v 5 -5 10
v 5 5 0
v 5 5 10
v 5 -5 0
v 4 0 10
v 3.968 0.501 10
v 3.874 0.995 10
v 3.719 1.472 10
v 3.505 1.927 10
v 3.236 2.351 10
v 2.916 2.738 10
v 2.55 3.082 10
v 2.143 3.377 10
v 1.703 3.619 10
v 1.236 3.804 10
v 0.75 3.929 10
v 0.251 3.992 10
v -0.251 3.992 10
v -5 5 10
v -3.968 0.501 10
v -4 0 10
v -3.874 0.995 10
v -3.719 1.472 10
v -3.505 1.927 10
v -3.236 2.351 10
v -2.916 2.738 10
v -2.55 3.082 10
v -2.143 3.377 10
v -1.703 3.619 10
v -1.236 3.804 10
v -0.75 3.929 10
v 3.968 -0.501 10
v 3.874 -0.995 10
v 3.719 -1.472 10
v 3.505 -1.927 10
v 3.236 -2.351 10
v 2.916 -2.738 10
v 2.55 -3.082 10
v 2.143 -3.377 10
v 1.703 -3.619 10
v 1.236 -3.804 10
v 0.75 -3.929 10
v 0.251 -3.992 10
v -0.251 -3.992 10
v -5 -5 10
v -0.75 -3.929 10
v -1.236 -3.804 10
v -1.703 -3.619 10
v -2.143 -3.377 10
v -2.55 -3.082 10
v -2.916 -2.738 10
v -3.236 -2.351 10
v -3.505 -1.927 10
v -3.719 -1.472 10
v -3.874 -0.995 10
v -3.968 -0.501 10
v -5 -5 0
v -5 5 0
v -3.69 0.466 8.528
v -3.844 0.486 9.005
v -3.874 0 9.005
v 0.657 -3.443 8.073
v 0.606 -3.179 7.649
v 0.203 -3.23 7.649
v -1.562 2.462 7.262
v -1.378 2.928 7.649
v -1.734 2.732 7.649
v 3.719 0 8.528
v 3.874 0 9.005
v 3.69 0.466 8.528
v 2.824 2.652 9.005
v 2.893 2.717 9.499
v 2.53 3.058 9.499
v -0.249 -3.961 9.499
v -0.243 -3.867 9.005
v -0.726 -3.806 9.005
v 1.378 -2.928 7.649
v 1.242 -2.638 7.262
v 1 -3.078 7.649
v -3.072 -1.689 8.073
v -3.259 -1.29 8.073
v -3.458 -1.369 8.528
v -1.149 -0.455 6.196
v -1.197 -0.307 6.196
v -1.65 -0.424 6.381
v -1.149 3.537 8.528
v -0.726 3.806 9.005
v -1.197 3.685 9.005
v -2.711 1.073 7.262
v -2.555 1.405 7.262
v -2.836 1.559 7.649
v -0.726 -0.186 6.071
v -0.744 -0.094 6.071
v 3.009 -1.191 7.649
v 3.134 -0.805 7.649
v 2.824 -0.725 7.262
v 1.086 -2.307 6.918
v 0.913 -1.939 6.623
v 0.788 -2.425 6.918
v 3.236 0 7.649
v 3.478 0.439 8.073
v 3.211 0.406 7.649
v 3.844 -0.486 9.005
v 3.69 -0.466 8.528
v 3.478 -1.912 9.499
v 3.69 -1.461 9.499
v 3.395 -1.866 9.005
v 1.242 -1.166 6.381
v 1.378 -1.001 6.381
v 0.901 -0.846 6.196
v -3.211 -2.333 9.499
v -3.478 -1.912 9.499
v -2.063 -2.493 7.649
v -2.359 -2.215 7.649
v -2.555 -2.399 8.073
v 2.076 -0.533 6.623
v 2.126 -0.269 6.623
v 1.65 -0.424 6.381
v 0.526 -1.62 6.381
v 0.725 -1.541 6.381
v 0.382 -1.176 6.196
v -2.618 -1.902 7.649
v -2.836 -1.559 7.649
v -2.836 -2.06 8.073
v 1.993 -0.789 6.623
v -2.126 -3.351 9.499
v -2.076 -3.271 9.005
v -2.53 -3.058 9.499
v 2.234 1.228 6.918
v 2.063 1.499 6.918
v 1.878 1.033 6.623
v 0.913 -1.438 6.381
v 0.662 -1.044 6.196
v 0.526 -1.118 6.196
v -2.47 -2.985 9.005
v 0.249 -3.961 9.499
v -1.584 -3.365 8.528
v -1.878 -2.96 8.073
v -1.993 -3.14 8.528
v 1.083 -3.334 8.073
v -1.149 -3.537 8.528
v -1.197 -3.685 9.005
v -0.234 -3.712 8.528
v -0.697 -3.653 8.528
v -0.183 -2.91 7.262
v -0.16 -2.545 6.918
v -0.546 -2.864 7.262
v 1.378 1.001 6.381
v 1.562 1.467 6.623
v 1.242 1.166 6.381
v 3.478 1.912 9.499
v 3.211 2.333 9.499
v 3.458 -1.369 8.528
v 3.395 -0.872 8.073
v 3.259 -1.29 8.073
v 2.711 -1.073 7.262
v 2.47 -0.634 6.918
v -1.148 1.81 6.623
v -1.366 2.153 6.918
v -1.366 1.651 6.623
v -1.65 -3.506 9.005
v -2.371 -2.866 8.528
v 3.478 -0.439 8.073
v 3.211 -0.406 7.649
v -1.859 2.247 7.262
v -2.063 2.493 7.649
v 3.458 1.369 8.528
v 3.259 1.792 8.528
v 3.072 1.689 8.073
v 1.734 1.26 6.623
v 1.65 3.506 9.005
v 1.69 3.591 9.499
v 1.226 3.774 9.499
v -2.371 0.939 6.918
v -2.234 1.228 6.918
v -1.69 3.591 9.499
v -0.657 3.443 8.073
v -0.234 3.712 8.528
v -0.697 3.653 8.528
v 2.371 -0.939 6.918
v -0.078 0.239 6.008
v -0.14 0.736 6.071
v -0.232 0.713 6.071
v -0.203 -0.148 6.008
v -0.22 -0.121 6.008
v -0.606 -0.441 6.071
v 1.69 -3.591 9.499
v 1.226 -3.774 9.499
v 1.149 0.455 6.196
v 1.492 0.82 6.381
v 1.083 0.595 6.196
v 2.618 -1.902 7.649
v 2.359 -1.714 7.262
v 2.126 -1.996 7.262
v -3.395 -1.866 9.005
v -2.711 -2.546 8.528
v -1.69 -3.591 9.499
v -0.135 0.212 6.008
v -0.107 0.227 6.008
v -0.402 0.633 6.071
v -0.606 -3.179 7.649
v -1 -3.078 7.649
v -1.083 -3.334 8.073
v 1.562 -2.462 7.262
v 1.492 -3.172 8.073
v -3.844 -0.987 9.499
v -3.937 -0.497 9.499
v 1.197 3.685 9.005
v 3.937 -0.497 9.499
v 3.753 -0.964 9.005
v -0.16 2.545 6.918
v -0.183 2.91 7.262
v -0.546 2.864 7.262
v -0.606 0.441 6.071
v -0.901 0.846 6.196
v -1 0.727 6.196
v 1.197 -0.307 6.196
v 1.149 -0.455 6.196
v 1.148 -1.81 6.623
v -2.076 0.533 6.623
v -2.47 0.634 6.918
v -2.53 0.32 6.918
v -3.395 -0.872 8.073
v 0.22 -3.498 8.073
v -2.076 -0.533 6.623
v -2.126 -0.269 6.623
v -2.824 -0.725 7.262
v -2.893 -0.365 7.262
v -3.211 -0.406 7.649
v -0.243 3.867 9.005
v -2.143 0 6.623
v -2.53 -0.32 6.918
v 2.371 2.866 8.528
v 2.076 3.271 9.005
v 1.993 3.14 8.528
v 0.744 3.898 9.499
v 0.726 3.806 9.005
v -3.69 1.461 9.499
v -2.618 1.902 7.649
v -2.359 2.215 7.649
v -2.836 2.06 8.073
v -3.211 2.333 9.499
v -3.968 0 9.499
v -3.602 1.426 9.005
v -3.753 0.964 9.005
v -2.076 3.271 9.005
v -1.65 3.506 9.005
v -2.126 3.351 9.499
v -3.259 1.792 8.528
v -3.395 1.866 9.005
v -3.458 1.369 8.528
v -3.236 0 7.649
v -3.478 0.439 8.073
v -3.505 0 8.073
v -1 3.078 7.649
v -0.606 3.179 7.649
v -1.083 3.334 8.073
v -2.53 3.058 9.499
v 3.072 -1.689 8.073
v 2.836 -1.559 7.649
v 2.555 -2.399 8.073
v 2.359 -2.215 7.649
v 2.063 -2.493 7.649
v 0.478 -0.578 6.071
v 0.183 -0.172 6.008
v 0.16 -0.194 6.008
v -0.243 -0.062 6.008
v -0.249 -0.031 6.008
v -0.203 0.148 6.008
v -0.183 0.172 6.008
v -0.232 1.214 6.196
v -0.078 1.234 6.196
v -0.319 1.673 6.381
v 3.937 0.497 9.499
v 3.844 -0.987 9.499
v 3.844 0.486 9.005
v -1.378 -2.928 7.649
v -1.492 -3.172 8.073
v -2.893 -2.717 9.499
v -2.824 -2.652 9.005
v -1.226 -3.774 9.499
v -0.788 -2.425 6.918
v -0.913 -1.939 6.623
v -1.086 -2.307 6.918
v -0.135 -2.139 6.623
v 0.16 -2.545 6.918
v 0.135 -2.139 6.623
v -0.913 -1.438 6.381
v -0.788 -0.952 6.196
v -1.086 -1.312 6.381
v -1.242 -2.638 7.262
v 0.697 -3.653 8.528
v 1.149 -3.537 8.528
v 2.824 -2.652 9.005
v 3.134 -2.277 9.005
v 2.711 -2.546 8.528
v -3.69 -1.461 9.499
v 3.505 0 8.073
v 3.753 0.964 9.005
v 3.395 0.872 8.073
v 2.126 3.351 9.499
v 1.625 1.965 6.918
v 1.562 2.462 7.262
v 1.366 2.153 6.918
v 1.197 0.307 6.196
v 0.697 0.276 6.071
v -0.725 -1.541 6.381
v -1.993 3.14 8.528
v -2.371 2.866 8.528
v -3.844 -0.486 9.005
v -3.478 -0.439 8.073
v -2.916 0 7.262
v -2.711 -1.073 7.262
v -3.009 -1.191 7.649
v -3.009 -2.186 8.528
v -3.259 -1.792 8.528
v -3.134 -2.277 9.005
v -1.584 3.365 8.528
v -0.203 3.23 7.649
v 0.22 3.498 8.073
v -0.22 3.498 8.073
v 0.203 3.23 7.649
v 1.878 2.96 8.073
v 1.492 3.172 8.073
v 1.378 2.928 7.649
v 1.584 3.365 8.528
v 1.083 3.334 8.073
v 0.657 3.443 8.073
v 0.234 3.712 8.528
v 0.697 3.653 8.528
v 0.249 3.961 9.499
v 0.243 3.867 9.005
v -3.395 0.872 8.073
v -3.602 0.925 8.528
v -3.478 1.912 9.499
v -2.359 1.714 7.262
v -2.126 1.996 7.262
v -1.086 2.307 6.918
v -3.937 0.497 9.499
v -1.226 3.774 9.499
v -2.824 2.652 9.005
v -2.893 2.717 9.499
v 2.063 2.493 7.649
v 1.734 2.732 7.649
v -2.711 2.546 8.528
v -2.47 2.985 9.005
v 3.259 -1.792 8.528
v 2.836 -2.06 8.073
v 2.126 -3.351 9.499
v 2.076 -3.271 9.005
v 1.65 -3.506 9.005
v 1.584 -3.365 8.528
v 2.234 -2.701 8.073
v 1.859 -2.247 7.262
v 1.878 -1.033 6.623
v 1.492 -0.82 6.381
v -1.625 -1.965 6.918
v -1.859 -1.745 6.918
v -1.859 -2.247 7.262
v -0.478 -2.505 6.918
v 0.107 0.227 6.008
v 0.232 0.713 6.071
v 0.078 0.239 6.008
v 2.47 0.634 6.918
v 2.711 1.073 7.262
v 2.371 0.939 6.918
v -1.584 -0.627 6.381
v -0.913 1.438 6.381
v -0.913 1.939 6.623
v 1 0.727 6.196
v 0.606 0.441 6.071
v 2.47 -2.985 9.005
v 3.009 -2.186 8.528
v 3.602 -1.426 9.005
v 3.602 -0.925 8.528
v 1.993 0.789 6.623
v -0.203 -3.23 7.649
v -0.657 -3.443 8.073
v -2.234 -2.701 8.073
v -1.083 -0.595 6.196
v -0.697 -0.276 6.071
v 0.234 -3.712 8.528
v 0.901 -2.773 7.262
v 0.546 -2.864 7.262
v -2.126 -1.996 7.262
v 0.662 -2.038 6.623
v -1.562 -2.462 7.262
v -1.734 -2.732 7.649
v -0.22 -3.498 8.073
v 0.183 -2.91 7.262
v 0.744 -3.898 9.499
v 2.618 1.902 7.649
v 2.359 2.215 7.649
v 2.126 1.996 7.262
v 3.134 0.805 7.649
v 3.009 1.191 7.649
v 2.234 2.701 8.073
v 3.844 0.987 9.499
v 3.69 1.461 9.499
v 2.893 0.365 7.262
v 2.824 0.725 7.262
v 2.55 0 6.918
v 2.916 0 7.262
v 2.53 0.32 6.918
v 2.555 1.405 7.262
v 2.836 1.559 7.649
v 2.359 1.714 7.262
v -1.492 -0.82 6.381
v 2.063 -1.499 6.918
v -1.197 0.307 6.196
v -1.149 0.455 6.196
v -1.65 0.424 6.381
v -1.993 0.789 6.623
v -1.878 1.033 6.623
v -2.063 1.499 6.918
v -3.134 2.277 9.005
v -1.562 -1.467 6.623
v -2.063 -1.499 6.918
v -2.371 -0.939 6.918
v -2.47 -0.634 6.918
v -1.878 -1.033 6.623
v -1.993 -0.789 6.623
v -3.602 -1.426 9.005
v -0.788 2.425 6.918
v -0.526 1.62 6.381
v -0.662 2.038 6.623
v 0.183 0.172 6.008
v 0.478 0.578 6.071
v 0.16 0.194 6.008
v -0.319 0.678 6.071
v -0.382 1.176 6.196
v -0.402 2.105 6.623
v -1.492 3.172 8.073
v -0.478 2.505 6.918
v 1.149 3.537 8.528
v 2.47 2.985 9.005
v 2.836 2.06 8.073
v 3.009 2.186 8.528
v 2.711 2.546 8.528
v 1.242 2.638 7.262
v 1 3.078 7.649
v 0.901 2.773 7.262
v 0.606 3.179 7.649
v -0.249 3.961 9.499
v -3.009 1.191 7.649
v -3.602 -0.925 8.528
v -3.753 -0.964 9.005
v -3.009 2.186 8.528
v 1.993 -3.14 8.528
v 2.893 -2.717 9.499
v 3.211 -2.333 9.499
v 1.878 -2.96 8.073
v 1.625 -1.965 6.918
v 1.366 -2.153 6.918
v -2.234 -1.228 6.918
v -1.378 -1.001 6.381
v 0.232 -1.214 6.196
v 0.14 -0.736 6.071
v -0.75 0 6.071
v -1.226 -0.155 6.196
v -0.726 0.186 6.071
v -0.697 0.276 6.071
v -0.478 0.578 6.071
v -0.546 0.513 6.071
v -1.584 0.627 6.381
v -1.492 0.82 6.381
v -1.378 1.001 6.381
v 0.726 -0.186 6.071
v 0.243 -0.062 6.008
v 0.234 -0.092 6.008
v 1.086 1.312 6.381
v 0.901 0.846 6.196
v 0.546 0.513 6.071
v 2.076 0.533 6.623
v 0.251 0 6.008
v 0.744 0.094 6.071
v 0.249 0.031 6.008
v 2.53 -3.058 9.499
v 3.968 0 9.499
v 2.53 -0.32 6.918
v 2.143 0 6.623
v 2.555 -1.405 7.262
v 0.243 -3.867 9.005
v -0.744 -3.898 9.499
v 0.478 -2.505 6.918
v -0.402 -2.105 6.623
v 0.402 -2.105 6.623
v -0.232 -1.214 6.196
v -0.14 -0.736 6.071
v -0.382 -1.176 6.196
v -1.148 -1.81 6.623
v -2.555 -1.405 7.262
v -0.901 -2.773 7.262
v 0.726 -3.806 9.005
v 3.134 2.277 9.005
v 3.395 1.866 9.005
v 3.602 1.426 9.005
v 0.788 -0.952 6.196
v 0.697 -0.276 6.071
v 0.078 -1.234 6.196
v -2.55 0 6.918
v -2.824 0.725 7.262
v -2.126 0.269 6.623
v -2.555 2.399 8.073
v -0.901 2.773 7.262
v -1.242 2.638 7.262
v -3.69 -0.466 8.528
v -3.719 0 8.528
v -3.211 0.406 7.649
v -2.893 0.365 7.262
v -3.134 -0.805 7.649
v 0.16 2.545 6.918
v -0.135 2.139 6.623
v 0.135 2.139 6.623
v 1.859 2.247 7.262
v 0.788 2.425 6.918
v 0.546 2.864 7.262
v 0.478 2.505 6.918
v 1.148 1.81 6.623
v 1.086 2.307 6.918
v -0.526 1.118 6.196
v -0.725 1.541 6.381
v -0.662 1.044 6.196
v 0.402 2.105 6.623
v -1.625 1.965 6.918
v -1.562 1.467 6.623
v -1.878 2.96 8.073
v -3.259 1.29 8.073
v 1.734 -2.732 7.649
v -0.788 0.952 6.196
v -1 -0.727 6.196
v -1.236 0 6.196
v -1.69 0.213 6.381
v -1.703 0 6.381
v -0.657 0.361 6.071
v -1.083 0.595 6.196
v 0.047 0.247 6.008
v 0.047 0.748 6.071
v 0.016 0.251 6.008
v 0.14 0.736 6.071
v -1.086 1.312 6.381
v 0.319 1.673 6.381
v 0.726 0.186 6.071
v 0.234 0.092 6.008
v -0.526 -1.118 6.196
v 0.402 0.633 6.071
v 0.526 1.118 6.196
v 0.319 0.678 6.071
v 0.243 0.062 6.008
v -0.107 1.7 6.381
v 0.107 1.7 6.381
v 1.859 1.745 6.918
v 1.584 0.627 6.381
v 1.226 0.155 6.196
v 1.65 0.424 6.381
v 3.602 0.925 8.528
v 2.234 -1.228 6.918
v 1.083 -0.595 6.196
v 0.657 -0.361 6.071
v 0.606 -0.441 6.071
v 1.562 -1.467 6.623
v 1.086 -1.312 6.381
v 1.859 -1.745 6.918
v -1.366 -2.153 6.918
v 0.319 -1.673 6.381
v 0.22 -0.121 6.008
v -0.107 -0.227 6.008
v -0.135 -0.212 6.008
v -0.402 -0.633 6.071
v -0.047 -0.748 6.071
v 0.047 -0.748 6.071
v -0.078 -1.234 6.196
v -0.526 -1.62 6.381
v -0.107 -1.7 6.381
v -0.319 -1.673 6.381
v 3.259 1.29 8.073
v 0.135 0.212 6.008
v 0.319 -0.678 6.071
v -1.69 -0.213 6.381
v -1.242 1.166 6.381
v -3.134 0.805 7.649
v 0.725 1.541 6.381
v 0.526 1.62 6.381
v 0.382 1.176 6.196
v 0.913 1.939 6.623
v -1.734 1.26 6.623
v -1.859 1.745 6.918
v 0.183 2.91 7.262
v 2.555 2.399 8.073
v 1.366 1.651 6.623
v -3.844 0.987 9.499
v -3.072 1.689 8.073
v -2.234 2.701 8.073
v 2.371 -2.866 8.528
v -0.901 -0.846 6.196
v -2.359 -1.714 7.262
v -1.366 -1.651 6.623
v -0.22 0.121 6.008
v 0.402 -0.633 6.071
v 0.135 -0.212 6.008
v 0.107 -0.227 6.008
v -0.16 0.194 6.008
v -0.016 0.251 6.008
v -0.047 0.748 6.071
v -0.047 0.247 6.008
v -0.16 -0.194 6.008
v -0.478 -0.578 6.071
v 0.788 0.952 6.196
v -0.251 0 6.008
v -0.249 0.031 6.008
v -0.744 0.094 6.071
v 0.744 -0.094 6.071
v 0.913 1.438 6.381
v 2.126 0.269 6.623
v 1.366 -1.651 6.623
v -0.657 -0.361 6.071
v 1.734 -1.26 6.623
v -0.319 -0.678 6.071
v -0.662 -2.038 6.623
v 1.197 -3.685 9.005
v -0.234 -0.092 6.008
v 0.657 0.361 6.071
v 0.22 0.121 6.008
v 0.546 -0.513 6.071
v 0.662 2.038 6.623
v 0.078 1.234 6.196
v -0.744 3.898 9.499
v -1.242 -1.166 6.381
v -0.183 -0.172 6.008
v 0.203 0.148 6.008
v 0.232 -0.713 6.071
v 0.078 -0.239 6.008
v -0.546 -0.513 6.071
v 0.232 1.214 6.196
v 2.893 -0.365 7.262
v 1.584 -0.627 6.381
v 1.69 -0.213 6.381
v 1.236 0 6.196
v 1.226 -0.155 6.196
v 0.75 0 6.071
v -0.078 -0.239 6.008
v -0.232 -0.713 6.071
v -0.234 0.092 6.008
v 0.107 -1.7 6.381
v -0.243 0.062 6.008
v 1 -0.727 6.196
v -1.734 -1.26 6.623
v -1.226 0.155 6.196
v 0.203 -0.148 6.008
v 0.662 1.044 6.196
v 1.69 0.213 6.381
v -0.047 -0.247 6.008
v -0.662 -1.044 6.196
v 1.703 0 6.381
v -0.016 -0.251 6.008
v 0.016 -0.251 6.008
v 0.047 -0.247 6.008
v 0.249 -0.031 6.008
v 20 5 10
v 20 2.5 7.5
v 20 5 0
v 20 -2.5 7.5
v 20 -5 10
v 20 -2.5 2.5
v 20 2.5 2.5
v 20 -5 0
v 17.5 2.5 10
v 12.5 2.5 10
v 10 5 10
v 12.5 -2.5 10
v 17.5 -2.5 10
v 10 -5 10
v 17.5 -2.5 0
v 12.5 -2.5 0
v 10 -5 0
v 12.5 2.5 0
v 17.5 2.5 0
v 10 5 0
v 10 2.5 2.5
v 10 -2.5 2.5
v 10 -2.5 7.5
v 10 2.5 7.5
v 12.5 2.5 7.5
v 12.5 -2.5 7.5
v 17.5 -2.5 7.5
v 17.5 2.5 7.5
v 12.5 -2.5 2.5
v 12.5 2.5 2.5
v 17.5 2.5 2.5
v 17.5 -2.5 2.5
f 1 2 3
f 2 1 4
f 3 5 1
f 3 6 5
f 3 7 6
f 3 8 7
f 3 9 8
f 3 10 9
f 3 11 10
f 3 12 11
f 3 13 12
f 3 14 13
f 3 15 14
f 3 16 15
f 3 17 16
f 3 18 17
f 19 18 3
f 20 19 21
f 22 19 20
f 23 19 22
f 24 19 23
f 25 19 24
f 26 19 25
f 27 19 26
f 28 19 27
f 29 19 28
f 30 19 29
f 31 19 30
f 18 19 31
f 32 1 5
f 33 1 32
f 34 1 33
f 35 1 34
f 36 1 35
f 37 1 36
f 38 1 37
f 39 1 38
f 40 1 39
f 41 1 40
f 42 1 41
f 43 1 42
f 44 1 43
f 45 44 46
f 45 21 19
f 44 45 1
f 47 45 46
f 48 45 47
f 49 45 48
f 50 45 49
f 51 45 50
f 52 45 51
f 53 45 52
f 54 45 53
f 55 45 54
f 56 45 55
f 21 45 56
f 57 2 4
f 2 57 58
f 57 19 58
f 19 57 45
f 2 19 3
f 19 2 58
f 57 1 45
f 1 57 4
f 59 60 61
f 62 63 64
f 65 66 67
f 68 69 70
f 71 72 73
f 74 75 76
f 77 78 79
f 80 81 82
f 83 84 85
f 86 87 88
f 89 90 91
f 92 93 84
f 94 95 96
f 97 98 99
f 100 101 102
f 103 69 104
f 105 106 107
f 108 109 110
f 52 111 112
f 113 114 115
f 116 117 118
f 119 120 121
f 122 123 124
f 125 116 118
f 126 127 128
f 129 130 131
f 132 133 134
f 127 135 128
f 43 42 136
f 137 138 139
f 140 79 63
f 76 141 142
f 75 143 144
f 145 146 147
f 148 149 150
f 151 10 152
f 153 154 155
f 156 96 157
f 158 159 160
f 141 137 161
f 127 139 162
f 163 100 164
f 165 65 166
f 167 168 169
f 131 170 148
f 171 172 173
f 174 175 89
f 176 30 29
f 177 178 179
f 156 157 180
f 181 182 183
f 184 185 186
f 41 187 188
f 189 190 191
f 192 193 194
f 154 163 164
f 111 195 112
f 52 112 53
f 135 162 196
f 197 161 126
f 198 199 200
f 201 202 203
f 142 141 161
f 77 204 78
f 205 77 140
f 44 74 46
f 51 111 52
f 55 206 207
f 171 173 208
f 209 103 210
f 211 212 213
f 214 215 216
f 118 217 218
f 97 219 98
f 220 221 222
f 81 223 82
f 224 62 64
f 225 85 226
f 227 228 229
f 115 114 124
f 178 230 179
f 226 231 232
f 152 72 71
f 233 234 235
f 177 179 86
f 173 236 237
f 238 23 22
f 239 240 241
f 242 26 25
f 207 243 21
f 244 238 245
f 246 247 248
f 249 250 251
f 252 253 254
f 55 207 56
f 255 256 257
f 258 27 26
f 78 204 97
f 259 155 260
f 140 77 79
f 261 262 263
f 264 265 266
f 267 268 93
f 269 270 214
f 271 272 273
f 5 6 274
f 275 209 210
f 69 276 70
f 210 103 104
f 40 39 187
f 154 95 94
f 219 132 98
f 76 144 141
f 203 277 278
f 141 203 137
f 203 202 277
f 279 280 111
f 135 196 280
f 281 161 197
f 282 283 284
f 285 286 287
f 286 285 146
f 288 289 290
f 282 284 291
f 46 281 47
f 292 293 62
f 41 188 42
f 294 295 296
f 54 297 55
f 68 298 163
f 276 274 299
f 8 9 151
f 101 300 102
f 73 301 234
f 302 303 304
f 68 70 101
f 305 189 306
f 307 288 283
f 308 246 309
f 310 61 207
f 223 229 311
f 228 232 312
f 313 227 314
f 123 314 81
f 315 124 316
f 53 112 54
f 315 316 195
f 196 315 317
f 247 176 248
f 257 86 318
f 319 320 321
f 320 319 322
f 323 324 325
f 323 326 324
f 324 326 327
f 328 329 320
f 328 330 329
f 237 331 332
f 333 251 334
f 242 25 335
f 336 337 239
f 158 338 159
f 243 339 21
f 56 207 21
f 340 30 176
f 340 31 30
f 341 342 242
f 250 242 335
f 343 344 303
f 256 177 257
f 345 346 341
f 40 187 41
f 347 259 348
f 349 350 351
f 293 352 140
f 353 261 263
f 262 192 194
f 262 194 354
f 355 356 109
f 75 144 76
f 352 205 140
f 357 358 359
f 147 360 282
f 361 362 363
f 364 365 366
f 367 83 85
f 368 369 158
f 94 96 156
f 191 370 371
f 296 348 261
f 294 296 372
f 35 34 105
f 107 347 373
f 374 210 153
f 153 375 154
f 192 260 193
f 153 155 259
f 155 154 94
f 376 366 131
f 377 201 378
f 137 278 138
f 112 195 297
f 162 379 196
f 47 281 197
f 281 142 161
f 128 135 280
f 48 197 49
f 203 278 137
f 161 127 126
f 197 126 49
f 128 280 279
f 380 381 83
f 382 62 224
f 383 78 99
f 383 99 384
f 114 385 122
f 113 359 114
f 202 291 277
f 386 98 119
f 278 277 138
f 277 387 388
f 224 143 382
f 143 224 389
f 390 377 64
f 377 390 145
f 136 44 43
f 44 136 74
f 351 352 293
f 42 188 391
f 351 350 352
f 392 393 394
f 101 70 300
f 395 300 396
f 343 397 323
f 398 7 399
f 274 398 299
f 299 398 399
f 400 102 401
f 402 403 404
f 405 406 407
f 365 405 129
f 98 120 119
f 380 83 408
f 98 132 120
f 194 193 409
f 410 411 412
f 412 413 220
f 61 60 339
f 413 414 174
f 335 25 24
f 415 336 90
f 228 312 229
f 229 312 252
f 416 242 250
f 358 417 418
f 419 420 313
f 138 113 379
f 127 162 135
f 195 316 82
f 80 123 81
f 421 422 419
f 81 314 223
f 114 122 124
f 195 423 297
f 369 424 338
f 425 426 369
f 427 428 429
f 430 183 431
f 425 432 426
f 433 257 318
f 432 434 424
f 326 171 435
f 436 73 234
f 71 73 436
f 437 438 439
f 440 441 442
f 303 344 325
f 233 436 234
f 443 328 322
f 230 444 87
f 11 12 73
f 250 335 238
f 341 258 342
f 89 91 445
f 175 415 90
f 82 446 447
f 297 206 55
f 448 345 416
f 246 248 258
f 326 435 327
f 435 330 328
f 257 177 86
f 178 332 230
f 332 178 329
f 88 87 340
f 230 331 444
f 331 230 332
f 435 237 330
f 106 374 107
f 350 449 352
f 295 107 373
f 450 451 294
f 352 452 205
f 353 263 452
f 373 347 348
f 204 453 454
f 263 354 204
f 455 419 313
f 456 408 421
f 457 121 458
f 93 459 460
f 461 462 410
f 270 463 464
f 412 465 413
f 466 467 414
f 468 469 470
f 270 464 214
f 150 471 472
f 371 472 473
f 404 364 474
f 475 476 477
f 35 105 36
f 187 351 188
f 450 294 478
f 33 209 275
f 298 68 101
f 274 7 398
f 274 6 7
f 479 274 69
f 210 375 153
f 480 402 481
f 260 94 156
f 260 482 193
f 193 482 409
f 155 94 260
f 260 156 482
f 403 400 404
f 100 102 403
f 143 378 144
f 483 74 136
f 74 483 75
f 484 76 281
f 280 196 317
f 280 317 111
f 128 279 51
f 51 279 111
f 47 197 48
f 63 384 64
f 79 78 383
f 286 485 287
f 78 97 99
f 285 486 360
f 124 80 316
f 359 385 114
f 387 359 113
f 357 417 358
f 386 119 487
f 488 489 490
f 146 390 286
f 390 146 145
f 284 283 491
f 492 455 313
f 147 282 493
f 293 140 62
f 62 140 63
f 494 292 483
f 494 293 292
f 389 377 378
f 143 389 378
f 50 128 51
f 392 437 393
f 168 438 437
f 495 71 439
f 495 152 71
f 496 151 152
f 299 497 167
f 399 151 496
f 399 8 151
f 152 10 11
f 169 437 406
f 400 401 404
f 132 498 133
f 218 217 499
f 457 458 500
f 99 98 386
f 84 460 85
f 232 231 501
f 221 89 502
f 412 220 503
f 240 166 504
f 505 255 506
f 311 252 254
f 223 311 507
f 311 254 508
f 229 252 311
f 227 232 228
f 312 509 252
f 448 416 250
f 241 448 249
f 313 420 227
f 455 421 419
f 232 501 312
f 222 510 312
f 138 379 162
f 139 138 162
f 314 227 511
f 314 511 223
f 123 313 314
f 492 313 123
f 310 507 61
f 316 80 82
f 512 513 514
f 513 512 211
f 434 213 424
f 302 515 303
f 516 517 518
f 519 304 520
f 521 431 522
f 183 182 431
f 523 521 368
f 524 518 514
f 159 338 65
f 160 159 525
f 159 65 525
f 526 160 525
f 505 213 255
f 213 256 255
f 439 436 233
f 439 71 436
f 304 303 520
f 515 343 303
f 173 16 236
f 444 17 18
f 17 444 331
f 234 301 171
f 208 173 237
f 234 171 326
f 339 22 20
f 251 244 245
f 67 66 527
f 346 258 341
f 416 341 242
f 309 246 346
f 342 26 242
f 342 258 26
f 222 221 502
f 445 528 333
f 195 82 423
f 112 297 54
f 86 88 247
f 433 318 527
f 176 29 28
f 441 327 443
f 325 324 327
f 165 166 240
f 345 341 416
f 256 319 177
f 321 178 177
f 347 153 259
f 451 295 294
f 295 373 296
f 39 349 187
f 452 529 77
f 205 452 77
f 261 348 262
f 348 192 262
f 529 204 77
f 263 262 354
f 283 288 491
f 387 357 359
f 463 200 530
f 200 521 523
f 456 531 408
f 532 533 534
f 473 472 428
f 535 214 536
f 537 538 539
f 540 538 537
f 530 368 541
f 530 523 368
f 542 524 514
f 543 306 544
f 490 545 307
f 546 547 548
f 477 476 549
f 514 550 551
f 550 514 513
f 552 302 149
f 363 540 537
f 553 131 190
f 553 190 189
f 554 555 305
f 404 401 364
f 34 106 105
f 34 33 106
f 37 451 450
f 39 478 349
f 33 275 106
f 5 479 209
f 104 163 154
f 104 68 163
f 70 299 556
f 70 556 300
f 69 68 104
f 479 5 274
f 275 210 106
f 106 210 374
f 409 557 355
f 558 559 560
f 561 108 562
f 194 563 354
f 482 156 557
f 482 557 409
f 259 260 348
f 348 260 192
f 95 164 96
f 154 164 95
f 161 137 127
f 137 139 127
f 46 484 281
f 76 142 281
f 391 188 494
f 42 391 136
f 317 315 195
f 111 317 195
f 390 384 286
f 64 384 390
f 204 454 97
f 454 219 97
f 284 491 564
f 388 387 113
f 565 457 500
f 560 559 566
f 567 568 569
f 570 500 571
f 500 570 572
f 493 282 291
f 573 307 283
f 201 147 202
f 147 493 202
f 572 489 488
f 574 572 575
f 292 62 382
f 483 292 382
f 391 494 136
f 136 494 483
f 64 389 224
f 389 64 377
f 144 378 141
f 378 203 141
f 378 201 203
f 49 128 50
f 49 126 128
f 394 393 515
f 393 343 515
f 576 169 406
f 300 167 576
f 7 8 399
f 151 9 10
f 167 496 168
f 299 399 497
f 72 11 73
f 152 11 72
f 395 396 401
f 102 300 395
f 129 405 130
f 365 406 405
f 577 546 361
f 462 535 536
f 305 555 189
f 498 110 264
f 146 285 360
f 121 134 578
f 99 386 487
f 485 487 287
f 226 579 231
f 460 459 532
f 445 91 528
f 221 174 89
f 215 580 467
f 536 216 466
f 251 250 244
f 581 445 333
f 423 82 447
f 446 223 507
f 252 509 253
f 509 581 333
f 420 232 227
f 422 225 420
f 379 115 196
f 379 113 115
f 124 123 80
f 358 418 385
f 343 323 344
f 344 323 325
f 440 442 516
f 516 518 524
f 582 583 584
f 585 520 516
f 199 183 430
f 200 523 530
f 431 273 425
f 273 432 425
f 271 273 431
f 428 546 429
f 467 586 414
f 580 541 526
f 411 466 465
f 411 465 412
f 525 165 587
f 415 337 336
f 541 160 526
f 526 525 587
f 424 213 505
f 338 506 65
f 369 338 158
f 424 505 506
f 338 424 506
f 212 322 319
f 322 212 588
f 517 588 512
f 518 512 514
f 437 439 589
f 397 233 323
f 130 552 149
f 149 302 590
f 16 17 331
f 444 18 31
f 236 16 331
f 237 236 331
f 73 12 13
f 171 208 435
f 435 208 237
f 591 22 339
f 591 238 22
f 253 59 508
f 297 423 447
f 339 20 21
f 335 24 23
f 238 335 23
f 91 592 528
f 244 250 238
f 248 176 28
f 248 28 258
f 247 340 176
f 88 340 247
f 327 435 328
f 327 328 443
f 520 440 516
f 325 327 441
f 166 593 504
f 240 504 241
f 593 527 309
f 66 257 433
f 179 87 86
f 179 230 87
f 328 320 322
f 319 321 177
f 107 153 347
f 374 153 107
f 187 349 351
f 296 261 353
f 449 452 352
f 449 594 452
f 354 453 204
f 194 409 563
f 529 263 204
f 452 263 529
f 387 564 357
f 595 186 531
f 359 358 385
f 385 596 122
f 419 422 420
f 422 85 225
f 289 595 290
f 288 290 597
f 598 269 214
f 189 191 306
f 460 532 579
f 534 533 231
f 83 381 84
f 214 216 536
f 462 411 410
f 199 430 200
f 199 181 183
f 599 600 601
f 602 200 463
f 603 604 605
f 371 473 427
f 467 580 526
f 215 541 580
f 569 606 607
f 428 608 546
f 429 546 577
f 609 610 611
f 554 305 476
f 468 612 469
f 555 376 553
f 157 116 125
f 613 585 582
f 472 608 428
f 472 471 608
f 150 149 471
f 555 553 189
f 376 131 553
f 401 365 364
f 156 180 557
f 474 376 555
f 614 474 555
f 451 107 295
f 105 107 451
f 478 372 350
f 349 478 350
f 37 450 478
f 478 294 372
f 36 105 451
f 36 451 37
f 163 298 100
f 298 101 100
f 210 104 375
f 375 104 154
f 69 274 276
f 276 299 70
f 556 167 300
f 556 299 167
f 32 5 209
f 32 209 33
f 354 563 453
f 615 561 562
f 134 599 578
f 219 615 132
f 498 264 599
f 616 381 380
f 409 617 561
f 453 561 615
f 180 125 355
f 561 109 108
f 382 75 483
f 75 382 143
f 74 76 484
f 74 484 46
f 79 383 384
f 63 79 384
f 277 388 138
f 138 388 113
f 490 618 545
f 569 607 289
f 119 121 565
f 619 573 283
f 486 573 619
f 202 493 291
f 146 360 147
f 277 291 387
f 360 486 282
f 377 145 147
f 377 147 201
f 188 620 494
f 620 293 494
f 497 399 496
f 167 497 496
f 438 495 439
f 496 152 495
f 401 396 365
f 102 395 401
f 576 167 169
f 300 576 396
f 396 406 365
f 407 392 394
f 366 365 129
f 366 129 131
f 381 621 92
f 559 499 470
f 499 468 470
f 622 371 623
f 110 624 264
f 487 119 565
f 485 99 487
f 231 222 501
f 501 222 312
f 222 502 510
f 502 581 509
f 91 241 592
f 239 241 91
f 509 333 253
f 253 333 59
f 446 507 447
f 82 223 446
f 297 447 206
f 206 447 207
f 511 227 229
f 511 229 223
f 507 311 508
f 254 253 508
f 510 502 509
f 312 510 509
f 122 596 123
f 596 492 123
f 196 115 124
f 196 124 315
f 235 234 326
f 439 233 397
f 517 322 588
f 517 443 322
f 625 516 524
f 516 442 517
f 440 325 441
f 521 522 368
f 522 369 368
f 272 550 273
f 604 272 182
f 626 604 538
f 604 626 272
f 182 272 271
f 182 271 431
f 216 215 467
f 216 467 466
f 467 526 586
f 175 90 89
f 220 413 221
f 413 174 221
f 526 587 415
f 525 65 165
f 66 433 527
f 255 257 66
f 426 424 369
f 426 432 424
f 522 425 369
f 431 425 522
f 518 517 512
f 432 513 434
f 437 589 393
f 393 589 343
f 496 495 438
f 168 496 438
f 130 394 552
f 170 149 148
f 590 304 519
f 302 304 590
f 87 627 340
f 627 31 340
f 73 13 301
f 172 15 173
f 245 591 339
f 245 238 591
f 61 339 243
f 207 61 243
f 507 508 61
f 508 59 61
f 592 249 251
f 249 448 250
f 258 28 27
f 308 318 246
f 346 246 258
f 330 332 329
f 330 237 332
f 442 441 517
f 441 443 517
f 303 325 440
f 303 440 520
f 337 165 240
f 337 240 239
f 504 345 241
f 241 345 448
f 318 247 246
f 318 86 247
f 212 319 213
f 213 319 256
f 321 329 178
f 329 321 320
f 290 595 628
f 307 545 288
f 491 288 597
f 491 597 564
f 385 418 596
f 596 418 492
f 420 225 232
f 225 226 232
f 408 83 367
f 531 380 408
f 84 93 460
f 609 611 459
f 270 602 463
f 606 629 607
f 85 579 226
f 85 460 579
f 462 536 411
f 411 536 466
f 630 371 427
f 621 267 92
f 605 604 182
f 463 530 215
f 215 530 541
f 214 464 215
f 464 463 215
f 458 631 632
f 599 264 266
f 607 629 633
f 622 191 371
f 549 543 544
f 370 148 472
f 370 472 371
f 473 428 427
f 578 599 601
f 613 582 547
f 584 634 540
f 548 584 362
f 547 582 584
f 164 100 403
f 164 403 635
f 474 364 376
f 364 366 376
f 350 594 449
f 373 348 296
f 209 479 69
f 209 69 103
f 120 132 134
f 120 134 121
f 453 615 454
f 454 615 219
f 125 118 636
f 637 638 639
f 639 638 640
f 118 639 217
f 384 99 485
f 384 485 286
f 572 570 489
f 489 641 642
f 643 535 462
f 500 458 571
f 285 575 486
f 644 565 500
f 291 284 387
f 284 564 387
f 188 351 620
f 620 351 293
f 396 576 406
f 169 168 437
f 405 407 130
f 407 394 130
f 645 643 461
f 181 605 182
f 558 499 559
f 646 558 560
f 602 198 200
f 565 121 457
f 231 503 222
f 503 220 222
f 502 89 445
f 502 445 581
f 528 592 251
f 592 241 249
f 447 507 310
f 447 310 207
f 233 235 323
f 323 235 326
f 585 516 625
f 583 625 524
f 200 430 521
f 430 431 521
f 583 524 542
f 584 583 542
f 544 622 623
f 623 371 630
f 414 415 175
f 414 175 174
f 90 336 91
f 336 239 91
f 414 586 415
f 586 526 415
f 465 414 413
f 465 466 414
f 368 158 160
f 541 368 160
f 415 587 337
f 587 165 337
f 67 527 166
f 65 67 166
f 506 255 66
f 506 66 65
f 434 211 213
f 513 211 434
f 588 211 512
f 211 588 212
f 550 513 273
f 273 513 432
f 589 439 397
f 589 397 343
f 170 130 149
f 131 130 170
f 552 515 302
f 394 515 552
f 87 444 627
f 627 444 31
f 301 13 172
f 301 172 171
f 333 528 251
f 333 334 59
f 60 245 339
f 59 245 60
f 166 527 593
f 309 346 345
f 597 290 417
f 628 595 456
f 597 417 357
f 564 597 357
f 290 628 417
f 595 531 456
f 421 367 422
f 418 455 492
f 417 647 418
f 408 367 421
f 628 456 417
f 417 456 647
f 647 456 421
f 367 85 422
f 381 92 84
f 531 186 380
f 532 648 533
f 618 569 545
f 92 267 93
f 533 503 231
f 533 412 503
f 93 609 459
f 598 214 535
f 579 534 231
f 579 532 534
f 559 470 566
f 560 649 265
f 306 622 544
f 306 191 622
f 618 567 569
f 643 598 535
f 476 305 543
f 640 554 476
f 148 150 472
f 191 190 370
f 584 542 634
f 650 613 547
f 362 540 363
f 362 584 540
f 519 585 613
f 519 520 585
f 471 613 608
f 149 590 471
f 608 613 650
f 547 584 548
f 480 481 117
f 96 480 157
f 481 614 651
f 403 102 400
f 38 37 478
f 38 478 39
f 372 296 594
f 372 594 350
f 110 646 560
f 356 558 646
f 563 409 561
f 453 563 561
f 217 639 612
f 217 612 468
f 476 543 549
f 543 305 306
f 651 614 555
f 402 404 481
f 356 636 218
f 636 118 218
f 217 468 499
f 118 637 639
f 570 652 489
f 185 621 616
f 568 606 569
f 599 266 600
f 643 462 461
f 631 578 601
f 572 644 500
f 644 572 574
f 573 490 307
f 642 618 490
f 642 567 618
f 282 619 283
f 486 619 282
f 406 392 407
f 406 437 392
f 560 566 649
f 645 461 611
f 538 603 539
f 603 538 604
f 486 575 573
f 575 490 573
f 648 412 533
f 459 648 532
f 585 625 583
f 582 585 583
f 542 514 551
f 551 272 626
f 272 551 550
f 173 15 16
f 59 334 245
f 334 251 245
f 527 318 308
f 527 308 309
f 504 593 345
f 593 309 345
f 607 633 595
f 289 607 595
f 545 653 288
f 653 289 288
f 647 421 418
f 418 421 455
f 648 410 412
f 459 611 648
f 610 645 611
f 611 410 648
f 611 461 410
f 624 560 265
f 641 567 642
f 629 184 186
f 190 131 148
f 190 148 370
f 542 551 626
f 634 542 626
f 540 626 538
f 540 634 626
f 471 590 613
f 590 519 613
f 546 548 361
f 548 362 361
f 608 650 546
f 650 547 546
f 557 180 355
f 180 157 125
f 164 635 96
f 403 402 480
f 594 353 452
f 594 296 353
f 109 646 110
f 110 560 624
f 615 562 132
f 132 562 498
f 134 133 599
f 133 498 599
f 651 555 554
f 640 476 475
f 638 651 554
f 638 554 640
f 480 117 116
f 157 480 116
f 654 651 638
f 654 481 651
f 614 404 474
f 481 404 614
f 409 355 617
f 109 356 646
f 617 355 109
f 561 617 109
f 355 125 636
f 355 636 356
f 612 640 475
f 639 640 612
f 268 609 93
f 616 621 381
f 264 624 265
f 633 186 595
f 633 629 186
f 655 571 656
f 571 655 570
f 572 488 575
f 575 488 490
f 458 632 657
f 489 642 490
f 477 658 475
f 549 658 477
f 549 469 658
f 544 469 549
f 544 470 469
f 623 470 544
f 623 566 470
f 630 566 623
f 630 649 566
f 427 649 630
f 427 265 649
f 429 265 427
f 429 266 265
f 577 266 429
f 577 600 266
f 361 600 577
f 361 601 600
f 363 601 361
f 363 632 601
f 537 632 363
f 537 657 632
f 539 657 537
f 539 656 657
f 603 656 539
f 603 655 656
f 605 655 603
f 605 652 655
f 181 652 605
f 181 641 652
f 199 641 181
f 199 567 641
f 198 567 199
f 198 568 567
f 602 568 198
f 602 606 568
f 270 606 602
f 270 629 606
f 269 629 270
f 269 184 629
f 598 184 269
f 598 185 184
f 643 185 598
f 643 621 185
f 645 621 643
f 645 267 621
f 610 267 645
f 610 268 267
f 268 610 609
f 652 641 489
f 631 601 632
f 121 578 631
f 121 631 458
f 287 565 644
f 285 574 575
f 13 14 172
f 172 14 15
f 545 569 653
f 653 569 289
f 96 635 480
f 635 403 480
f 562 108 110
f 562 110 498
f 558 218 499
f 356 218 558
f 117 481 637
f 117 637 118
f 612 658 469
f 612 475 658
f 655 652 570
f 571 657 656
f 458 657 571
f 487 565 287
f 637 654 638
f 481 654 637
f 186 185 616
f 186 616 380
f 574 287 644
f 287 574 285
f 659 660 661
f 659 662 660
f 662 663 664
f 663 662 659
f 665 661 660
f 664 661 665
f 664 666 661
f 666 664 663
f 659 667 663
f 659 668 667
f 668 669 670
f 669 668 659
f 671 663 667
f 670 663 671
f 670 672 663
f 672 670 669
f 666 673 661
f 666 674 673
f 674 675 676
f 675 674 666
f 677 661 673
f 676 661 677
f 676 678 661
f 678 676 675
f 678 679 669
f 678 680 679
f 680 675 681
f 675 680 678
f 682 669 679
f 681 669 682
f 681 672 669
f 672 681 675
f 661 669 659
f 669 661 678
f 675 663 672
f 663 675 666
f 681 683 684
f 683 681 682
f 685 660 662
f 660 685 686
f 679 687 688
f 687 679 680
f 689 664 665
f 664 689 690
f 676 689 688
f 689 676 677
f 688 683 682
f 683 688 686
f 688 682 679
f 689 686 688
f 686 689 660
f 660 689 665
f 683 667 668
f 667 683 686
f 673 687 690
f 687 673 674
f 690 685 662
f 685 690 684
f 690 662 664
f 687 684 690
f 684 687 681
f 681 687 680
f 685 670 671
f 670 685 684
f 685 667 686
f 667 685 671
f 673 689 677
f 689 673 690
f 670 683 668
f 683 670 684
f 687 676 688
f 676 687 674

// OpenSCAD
difference() {
  translate([-5, -5, 0]) cube([10, 10, 10]);
  translate([0, 0, 10]) sphere(4, $fn=50);
}

translate([10, -5, 0]) difference() {
  cube([10, 10, 10]);
  translate([-1, 2.5, 2.5]) cube([12, 5, 5]);
  #translate([2.5, 2.5, -1]) cube([5, 5, 12]);
}
